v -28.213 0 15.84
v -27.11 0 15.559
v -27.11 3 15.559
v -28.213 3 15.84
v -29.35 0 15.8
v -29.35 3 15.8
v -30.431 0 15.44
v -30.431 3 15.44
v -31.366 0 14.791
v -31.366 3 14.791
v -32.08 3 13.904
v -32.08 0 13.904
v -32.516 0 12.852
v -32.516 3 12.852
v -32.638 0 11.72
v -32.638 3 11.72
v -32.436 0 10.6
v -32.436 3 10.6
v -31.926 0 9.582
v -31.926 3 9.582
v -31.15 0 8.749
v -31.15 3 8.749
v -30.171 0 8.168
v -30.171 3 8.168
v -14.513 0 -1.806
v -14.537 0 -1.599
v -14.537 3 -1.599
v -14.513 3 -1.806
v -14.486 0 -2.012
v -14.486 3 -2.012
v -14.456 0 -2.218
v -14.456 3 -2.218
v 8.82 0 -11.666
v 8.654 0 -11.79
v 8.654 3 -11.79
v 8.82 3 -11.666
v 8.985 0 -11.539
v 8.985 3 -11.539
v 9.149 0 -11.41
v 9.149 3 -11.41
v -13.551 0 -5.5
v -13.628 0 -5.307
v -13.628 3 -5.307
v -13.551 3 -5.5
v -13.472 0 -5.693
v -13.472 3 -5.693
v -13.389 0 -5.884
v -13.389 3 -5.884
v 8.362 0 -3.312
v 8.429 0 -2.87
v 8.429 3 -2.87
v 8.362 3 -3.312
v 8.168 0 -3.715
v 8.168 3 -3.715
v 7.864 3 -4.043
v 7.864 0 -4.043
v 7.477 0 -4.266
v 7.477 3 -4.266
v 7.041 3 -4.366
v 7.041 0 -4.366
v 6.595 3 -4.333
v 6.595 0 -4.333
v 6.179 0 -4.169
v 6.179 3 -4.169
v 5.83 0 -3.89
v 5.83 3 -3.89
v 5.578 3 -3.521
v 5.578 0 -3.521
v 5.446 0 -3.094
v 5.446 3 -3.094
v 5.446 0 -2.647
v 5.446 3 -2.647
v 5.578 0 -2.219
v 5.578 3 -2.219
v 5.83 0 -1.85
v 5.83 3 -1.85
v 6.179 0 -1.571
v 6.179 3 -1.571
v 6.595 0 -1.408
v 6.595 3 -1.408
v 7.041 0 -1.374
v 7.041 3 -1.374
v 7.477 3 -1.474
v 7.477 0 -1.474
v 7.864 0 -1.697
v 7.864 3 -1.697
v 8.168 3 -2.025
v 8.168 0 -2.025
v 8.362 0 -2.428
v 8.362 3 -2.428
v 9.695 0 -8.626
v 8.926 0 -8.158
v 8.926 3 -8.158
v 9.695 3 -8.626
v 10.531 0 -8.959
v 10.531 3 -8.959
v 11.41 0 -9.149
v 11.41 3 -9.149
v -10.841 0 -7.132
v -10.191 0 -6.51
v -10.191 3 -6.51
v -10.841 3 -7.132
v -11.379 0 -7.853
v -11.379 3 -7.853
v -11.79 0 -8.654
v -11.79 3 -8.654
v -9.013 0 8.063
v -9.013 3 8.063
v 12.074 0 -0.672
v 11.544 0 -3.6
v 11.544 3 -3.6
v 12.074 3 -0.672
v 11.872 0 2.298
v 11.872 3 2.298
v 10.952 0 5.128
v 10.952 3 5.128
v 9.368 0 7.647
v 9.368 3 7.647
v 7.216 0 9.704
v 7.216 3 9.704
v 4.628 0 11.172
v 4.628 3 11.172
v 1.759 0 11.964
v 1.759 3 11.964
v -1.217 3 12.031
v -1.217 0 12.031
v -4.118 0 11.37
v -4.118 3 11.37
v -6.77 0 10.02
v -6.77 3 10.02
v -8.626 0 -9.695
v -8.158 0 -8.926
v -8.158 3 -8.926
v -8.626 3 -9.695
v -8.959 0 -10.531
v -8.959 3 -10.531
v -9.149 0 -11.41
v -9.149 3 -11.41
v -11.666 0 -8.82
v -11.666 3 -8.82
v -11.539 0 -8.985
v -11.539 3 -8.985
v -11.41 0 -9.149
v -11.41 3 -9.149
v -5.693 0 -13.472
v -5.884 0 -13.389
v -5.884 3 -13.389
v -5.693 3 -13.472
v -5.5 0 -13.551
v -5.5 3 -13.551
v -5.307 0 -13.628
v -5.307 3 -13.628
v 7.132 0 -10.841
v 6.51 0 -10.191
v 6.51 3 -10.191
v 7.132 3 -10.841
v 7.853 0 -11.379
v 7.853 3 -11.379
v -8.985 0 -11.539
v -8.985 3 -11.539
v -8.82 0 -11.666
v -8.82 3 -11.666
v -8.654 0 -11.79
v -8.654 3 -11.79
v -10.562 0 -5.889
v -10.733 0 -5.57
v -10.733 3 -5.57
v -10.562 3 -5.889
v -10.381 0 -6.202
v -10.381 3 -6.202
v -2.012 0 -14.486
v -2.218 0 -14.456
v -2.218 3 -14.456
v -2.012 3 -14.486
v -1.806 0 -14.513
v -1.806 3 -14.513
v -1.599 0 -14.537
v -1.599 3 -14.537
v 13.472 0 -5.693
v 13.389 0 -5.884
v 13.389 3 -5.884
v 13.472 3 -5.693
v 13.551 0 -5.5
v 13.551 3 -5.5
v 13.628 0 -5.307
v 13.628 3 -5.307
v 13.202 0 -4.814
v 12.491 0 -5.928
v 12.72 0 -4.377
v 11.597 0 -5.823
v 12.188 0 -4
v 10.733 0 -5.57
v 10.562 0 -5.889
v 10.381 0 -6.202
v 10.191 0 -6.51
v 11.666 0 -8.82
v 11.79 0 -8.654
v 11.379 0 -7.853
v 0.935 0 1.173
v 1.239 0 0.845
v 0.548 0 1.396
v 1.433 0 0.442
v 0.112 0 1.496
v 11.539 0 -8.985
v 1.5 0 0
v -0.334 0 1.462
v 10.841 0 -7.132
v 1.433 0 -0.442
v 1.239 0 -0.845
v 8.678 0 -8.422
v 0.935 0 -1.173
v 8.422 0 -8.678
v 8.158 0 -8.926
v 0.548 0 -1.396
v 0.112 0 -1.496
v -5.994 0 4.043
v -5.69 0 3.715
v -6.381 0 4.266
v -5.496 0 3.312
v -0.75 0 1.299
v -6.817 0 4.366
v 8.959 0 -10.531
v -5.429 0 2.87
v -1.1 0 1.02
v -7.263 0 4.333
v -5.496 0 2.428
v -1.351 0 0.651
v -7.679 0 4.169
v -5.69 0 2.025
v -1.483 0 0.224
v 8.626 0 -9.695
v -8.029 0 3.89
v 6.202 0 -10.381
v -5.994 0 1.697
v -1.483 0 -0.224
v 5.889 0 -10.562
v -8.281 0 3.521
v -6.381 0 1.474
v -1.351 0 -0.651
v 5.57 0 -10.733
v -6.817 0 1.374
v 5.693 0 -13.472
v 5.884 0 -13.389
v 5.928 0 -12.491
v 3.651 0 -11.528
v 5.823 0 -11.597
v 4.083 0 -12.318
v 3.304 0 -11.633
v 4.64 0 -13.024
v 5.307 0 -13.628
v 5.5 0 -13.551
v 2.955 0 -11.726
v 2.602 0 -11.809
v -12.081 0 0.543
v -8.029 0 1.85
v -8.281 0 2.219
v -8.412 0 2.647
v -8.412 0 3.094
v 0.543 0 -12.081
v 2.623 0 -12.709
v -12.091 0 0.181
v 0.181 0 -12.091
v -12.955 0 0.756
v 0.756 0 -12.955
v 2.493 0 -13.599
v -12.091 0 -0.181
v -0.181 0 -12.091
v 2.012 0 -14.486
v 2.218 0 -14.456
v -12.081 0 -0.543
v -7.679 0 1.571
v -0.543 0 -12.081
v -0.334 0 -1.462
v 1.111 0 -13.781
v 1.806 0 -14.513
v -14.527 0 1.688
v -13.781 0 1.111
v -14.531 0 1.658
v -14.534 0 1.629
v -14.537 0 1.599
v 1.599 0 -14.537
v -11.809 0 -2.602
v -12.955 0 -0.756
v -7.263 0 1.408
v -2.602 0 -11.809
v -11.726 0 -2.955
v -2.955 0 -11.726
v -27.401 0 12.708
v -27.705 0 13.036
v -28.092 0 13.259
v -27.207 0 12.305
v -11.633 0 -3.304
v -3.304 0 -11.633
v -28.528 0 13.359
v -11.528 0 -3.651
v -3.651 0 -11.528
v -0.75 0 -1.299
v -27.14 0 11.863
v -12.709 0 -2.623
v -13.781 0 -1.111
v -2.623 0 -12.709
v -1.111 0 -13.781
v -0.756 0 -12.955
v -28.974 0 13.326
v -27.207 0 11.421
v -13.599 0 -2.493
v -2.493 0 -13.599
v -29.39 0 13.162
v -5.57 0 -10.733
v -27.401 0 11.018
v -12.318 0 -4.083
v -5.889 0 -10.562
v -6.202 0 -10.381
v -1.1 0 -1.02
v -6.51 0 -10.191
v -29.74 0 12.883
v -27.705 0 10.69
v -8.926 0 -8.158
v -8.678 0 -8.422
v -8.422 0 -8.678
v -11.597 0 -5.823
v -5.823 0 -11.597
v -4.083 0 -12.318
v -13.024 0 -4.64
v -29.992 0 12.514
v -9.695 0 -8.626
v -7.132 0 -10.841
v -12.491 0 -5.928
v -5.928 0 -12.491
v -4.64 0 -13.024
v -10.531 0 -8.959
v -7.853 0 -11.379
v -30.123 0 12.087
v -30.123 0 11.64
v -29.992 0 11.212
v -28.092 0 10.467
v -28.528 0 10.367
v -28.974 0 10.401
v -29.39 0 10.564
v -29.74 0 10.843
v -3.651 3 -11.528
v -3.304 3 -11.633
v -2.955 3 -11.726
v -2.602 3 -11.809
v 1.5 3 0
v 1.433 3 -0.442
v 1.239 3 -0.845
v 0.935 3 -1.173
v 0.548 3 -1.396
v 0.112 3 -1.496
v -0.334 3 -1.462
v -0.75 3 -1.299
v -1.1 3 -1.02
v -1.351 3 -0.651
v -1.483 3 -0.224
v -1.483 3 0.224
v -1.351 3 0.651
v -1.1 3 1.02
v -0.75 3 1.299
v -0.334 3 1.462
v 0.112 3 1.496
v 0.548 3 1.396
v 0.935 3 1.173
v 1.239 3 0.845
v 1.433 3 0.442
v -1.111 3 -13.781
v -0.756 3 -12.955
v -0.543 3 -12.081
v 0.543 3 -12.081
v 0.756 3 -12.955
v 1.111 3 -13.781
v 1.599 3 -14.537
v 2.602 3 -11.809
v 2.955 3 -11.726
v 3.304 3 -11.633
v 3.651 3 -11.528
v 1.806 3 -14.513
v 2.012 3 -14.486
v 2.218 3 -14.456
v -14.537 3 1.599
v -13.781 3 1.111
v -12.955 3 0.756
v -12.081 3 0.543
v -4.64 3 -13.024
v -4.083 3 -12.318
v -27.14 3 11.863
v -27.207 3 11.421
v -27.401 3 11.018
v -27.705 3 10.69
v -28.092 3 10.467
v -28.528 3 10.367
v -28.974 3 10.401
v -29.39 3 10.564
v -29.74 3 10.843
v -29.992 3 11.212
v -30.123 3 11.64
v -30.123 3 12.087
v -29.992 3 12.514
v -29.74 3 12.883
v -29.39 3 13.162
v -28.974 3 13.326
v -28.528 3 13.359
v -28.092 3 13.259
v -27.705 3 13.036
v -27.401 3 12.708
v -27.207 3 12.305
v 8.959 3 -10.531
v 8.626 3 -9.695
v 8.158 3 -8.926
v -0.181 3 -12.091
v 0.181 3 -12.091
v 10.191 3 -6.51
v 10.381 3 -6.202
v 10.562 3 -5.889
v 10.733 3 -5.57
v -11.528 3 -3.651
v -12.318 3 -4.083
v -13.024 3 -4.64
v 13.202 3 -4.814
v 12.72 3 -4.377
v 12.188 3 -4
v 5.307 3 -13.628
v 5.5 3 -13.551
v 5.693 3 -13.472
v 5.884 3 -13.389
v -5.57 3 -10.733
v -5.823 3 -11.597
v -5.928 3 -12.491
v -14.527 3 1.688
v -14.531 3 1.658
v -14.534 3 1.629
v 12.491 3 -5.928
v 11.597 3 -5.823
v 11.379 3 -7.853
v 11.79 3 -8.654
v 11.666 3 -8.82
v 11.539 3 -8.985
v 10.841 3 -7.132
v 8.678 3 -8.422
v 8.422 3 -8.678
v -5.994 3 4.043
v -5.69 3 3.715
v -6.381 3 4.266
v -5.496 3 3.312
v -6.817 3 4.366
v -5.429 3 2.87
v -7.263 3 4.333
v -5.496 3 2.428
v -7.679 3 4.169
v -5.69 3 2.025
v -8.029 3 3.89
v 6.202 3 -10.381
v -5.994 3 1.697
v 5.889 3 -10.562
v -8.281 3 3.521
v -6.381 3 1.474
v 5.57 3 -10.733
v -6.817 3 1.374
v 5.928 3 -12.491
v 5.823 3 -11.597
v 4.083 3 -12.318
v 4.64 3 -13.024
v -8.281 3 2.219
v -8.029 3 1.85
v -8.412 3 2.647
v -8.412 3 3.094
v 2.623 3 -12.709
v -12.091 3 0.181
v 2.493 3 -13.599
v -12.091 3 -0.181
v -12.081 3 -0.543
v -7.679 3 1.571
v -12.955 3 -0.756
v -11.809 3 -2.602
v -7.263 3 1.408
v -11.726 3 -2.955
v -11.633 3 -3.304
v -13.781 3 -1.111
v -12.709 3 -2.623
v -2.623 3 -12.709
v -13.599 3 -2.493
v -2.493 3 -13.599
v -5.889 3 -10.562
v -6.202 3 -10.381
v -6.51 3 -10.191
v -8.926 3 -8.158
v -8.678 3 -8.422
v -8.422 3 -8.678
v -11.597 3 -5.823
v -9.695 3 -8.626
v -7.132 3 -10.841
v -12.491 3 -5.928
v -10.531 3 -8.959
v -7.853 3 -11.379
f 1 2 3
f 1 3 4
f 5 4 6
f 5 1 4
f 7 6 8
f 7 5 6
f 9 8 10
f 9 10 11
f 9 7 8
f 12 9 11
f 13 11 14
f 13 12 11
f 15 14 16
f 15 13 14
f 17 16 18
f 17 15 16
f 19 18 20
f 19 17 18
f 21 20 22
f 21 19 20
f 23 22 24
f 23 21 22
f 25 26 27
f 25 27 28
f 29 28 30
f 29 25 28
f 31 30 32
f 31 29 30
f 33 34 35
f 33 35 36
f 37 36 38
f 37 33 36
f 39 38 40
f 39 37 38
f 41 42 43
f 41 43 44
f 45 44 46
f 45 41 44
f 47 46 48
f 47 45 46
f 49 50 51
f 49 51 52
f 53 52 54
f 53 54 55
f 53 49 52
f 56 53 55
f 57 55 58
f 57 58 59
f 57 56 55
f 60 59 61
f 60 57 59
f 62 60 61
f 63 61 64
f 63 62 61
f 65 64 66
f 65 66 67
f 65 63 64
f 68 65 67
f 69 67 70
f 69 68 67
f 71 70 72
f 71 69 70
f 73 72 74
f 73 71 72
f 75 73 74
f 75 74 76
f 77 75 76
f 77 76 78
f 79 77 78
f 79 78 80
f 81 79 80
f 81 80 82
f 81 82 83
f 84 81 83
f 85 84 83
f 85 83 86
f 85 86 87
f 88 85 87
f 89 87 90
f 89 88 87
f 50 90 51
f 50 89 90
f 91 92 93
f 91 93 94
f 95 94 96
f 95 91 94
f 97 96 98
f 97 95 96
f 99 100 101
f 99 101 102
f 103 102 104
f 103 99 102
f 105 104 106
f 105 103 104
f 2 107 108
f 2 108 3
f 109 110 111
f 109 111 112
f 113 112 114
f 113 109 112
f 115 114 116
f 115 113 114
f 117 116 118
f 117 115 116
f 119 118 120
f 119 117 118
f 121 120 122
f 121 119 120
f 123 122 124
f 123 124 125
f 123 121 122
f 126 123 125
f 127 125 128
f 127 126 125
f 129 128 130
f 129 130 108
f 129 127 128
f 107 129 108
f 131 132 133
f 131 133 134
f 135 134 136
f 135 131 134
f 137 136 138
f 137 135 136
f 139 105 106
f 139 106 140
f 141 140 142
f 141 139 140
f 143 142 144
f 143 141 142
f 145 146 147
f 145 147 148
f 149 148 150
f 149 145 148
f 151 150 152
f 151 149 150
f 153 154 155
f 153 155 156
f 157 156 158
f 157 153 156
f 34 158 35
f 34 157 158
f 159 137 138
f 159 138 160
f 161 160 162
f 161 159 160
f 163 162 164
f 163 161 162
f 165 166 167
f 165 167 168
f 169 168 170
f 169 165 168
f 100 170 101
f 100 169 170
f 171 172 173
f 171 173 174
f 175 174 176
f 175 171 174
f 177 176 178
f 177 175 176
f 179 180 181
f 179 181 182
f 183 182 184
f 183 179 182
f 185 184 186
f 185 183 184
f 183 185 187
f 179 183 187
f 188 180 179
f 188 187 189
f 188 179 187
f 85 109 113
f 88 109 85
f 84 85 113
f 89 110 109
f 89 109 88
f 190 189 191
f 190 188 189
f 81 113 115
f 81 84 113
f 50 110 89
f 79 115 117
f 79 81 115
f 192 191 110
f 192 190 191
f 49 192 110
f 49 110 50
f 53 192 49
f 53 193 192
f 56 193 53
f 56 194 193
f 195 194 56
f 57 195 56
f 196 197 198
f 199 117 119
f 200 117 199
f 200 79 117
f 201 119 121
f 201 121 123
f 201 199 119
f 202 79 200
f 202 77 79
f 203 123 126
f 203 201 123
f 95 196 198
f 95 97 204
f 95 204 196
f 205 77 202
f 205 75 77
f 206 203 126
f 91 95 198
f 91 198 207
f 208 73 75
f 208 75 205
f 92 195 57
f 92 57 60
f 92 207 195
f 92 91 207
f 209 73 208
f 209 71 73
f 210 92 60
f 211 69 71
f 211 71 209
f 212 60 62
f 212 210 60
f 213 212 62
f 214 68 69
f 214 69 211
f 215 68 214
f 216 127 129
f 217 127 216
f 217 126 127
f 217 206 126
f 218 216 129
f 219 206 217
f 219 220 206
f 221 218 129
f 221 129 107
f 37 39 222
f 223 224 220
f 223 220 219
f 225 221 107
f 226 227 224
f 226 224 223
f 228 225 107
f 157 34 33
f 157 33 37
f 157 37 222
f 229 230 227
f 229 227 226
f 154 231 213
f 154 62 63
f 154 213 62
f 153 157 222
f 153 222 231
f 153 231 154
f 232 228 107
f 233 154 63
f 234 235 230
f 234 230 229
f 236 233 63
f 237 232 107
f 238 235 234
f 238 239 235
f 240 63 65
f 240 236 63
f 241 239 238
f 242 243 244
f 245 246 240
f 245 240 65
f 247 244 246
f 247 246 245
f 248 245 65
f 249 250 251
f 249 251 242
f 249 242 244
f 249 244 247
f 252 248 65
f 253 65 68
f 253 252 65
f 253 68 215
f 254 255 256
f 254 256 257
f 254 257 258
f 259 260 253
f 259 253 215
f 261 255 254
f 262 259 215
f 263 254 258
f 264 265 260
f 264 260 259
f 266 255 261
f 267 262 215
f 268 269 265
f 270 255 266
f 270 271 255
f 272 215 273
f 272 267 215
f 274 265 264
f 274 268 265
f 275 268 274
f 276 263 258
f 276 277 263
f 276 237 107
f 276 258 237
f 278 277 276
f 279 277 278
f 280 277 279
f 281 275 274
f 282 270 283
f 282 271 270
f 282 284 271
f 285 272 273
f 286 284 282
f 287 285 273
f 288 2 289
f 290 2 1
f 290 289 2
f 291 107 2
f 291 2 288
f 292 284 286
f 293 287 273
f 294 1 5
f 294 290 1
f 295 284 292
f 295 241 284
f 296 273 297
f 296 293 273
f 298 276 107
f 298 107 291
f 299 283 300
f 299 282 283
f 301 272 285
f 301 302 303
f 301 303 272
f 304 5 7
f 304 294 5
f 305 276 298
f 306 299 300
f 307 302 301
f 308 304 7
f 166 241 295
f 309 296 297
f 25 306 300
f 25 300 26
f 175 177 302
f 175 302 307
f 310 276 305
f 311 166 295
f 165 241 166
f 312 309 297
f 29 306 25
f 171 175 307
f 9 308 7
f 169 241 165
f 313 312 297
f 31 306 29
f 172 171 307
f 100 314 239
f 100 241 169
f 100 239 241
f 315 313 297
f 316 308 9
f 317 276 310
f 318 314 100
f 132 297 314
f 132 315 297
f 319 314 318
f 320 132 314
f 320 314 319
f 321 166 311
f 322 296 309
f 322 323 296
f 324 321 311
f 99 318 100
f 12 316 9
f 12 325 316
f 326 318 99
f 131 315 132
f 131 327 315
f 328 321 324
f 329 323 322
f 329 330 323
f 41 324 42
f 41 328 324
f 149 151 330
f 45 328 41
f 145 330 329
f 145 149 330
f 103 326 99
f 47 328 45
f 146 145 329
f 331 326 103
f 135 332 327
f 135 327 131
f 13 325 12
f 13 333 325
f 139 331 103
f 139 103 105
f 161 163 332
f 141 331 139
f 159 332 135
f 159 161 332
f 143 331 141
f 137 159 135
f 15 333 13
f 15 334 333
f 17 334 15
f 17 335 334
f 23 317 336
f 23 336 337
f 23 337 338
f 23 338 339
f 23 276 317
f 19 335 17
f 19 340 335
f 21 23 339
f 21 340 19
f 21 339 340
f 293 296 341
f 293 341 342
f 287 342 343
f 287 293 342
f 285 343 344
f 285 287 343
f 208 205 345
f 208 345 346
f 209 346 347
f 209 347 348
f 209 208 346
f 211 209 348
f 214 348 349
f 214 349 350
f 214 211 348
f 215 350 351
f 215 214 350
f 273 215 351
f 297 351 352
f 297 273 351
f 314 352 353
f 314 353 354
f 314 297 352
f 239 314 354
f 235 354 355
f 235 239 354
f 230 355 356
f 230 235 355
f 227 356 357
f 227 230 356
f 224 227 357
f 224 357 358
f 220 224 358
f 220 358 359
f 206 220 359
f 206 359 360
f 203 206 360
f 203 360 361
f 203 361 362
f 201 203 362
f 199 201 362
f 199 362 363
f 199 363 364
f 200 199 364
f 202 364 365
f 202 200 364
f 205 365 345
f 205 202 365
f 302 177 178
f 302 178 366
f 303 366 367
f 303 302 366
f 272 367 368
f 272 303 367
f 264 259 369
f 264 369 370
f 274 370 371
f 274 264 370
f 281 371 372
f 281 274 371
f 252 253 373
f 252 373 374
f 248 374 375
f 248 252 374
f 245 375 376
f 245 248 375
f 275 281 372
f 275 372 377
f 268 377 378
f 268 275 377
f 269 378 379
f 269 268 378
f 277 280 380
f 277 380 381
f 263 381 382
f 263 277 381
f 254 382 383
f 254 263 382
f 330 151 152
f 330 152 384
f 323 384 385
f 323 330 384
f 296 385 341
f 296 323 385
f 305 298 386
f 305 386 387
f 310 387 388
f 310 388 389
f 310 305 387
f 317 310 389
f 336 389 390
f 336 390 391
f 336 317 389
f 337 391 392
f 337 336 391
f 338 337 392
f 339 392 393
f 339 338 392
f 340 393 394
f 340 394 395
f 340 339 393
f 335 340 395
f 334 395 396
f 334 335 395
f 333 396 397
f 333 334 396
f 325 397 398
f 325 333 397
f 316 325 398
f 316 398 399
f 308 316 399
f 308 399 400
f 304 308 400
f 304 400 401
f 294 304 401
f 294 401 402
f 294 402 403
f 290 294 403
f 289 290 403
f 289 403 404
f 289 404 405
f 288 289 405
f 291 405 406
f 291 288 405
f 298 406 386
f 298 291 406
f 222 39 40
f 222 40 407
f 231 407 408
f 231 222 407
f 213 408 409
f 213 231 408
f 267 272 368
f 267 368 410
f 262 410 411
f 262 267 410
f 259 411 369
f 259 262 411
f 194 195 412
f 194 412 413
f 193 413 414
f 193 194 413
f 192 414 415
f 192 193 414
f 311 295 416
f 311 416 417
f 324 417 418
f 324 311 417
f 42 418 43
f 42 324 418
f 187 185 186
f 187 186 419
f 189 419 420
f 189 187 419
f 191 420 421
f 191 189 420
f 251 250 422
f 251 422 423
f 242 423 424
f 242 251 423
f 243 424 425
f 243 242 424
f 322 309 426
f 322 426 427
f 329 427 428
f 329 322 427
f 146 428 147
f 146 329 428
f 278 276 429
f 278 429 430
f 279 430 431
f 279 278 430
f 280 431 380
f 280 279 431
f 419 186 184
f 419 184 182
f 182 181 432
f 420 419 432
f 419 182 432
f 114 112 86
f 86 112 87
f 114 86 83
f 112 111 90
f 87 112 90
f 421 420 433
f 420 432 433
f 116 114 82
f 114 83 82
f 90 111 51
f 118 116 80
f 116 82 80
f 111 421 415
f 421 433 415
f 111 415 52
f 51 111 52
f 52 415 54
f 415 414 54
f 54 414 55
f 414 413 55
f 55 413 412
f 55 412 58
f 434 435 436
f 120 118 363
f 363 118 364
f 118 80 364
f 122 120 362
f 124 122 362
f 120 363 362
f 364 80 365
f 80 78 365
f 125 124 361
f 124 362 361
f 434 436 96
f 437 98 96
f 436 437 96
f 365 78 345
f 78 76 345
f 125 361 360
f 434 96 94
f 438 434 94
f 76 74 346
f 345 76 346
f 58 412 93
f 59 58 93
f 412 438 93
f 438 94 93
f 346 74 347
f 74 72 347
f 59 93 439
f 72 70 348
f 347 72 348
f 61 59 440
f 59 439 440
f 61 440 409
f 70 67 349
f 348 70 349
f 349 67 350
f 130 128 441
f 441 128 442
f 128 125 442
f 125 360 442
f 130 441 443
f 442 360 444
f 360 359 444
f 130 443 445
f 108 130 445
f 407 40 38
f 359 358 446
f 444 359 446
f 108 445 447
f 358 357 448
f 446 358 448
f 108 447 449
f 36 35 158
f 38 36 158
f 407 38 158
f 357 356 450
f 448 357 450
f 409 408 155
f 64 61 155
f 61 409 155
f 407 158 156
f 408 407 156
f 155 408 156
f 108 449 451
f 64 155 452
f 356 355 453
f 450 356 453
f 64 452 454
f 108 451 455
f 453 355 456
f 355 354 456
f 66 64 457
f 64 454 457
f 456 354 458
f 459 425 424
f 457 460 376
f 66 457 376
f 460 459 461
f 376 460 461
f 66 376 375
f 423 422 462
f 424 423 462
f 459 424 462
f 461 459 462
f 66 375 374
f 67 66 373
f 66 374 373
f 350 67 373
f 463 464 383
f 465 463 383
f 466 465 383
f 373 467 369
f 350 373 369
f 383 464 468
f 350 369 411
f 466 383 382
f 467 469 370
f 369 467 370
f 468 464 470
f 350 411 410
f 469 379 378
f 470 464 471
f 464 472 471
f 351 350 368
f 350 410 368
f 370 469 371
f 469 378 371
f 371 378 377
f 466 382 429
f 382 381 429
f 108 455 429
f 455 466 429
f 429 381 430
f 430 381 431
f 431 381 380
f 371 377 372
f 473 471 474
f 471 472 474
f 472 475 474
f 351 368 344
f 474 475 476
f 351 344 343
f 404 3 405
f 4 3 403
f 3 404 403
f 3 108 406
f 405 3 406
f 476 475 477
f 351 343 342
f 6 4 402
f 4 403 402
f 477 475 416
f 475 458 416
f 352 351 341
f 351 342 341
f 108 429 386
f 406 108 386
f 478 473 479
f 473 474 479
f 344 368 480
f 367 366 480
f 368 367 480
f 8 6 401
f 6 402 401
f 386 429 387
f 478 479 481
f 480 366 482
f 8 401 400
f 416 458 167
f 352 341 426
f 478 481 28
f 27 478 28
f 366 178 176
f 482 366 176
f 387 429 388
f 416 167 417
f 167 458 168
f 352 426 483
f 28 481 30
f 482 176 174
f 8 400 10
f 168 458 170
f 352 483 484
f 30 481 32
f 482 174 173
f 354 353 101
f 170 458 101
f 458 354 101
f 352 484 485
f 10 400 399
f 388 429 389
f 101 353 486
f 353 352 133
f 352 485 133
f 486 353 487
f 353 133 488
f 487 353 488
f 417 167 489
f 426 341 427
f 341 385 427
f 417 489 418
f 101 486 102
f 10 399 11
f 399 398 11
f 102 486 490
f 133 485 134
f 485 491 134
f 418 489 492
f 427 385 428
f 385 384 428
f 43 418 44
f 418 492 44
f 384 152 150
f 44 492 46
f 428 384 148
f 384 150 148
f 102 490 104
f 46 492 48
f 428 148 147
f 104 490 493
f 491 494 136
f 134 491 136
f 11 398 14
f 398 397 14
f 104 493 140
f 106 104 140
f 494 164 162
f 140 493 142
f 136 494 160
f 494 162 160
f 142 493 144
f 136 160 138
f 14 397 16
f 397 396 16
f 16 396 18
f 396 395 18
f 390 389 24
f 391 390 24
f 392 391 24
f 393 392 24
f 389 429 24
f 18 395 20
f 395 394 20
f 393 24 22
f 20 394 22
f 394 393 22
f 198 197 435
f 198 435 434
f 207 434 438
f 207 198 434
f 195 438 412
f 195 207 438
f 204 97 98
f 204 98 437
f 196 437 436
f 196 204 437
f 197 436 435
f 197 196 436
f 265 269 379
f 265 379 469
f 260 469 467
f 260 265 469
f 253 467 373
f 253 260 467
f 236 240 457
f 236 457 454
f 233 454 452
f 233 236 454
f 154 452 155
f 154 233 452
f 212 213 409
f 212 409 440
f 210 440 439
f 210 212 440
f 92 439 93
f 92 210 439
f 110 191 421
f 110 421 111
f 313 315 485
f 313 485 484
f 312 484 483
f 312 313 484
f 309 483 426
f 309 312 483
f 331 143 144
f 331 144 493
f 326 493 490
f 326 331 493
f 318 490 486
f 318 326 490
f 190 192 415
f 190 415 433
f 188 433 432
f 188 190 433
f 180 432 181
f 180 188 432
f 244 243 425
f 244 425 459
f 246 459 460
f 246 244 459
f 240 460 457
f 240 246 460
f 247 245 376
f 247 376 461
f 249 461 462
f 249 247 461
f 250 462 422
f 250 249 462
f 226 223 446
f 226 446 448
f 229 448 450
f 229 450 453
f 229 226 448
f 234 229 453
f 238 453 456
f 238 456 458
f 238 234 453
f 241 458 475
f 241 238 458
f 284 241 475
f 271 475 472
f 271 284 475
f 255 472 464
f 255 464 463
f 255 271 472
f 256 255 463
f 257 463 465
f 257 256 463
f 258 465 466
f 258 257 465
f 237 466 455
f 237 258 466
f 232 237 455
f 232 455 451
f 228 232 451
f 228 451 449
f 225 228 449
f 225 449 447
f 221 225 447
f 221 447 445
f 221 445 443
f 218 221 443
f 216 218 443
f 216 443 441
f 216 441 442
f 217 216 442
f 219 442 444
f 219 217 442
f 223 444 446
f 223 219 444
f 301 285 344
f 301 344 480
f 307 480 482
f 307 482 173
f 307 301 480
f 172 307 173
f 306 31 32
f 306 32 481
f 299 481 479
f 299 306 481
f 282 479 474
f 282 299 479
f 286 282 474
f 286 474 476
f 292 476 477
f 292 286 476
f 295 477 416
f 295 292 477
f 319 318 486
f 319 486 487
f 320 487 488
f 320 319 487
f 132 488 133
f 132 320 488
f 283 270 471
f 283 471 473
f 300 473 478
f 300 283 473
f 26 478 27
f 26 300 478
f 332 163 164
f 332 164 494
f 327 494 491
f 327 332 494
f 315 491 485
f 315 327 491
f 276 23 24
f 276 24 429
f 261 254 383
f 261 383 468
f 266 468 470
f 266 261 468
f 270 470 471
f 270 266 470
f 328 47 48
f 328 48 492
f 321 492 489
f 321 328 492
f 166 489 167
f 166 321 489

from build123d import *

# Parameters (mm, degrees)
SKETCH1_R           = 1.5
BOSS_EXTRUDE1_DEPTH = 3


with BuildPart() as part:
    # Sketch1 → Boss-Extrude1 (new body)
    with BuildSketch(Plane(origin=(0, 0, 0), x_dir=(1, 0, 0), z_dir=(0, 1, 0))):
        with BuildLine():
            Line((-9.012614242, -8.062715867), (-27.10951678, -15.558698335))
            ThreePointArc((-27.10951678, -15.558698335), (-32.335768639, -13.393913934), (-30.170984238, -8.167662075))
            Line((-30.170984238, -8.167662075), (-14.527279952, -1.687827594))
            ThreePointArc((-14.527279952, -1.687827594), (-14.532365143, -1.643468323), (-14.537314884, -1.599093734))
            ThreePointArc((-14.537314884, -1.599093734), (-13.375367561, -0.916420891), (-12.08056518, -0.542722374))
            ThreePointArc((-12.08056518, -0.542722374), (-12.092750003, -1.6e-08), (-12.080565181, 0.542722343))
            ThreePointArc((-12.080565181, 0.542722343), (-13.375367564, 0.91642086), (-14.537314887, 1.599093703))
            ThreePointArc((-14.537314887, 1.599093703), (-14.499881093, 1.908945545), (-14.455843804, 2.217928021))
            ThreePointArc((-14.455843804, 2.217928021), (-13.156800144, 2.576605254), (-11.80939679, 2.602450787))
            ThreePointArc((-11.80939679, 2.602450787), (-11.680699543, 3.129833994), (-11.528463026, 3.650909874))
            ThreePointArc((-11.528463026, 3.650909874), (-12.682425794, 4.346994439), (-13.628091988, 5.307139865))
            ThreePointArc((-13.628091988, 5.307139865), (-13.511738162, 5.596745183), (-13.389230858, 5.883801647))
            ThreePointArc((-13.389230858, 5.883801647), (-12.041618538, 5.89404001), (-10.733437524, 5.570271228))
            ThreePointArc((-10.733437524, 5.570271228), (-10.472628711, 6.046374991), (-10.190715165, 6.51029393))
            ThreePointArc((-10.190715165, 6.51029393), (-11.125197663, 7.48132753), (-11.790137141, 8.653513216))
            ThreePointArc((-11.790137141, 8.653513216), (-11.602792603, 8.903135886), (-11.410163954, 9.148703915))
            ThreePointArc((-11.410163954, 9.148703915), (-10.105820527, 8.80980568), (-8.926012227, 8.158486891))
            ThreePointArc((-8.926012227, 8.158486891), (-8.550865537, 8.550865523), (-8.158486906, 8.926012214))
            ThreePointArc((-8.158486906, 8.926012214), (-8.809805695, 10.105820514), (-9.148703931, 11.410163942))
            ThreePointArc((-9.148703931, 11.410163942), (-8.903135901, 11.602792591), (-8.653513232, 11.79013713))
            ThreePointArc((-8.653513232, 11.79013713), (-7.481327547, 11.125197652), (-6.510293947, 10.190715155))
            ThreePointArc((-6.510293947, 10.190715155), (-6.046375007, 10.472628701), (-5.570271245, 10.733437515))
            ThreePointArc((-5.570271245, 10.733437515), (-5.894040027, 12.04161853), (-5.883801664, 13.38923085))
            ThreePointArc((-5.883801664, 13.38923085), (-5.5967452, 13.511738155), (-5.307139882, 13.628091982))
            ThreePointArc((-5.307139882, 13.628091982), (-4.346994456, 12.682425788), (-3.650909891, 11.52846302))
            ThreePointArc((-3.650909891, 11.52846302), (-3.129834011, 11.680699538), (-2.602450802, 11.809396786))
            ThreePointArc((-2.602450802, 11.809396786), (-2.57660527, 13.156800141), (-2.217928037, 14.455843802))
            ThreePointArc((-2.217928037, 14.455843802), (-1.908945561, 14.499881091), (-1.599093718, 14.537314885))
            ThreePointArc((-1.599093718, 14.537314885), (-0.916420875, 13.375367563), (-0.542722359, 12.08056518))
            ThreePointArc((-0.542722359, 12.08056518), (2e-09, 12.092750003), (0.542722362, 12.08056518))
            ThreePointArc((0.542722362, 12.08056518), (0.916420879, 13.375367562), (1.599093721, 14.537314885))
            ThreePointArc((1.599093721, 14.537314885), (1.908945564, 14.49988109), (2.21792804, 14.455843801))
            ThreePointArc((2.21792804, 14.455843801), (2.576605273, 13.15680014), (2.602450806, 11.809396786))
            ThreePointArc((2.602450806, 11.809396786), (3.129834014, 11.680699537), (3.650909894, 11.528463019))
            ThreePointArc((3.650909894, 11.528463019), (4.346994459, 12.682425786), (5.307139885, 13.628091981))
            ThreePointArc((5.307139885, 13.628091981), (5.596745203, 13.511738153), (5.883801667, 13.389230849))
            ThreePointArc((5.883801667, 13.389230849), (5.89404003, 12.041618528), (5.570271248, 10.733437514))
            ThreePointArc((5.570271248, 10.733437514), (6.04637501, 10.4726287), (6.510293949, 10.190715153))
            ThreePointArc((6.510293949, 10.190715153), (7.481327549, 11.12519765), (8.653513234, 11.790137128))
            ThreePointArc((8.653513234, 11.790137128), (8.903135904, 11.602792589), (9.148703933, 11.41016394))
            ThreePointArc((9.148703933, 11.41016394), (8.809805697, 10.105820513), (8.158486908, 8.926012212))
            ThreePointArc((8.158486908, 8.926012212), (8.550865539, 8.550865522), (8.926012229, 8.15848689))
            ThreePointArc((8.926012229, 8.15848689), (10.105820529, 8.809805679), (11.410163956, 9.148703914))
            ThreePointArc((11.410163956, 9.148703914), (11.602792604, 8.903135884), (11.790137143, 8.653513214))
            ThreePointArc((11.790137143, 8.653513214), (11.125197664, 7.481327529), (10.190715166, 6.510293928))
            ThreePointArc((10.190715166, 6.510293928), (10.472628712, 6.046374989), (10.733437525, 5.570271227))
            ThreePointArc((10.733437525, 5.570271227), (12.041618538, 5.894040009), (13.389230858, 5.883801646))
            ThreePointArc((13.389230858, 5.883801646), (13.511738162, 5.596745182), (13.628091989, 5.307139864))
            ThreePointArc((13.628091989, 5.307139864), (12.967370885, 4.588201714), (12.187984486, 3.999999979))
            Line((12.187984486, 3.999999979), (11.544422781, 3.600125731))
            ThreePointArc((11.544422781, 3.600125731), (5.967242425, -10.517919019), (-9.012614242, -8.062715867))
        make_face()
        Circle(SKETCH1_R, mode=Mode.SUBTRACT)
        with Locations((-28.640250509, -11.863180205)):
            Circle(SKETCH1_R, mode=Mode.SUBTRACT)
        with Locations((-6.929096489, -2.870125744)):
            Circle(SKETCH1_R, mode=Mode.SUBTRACT)
        with Locations((6.929111486, 2.870131956)):
            Circle(SKETCH1_R, mode=Mode.SUBTRACT)
    extrude(amount=BOSS_EXTRUDE1_DEPTH)


solid = part.part
